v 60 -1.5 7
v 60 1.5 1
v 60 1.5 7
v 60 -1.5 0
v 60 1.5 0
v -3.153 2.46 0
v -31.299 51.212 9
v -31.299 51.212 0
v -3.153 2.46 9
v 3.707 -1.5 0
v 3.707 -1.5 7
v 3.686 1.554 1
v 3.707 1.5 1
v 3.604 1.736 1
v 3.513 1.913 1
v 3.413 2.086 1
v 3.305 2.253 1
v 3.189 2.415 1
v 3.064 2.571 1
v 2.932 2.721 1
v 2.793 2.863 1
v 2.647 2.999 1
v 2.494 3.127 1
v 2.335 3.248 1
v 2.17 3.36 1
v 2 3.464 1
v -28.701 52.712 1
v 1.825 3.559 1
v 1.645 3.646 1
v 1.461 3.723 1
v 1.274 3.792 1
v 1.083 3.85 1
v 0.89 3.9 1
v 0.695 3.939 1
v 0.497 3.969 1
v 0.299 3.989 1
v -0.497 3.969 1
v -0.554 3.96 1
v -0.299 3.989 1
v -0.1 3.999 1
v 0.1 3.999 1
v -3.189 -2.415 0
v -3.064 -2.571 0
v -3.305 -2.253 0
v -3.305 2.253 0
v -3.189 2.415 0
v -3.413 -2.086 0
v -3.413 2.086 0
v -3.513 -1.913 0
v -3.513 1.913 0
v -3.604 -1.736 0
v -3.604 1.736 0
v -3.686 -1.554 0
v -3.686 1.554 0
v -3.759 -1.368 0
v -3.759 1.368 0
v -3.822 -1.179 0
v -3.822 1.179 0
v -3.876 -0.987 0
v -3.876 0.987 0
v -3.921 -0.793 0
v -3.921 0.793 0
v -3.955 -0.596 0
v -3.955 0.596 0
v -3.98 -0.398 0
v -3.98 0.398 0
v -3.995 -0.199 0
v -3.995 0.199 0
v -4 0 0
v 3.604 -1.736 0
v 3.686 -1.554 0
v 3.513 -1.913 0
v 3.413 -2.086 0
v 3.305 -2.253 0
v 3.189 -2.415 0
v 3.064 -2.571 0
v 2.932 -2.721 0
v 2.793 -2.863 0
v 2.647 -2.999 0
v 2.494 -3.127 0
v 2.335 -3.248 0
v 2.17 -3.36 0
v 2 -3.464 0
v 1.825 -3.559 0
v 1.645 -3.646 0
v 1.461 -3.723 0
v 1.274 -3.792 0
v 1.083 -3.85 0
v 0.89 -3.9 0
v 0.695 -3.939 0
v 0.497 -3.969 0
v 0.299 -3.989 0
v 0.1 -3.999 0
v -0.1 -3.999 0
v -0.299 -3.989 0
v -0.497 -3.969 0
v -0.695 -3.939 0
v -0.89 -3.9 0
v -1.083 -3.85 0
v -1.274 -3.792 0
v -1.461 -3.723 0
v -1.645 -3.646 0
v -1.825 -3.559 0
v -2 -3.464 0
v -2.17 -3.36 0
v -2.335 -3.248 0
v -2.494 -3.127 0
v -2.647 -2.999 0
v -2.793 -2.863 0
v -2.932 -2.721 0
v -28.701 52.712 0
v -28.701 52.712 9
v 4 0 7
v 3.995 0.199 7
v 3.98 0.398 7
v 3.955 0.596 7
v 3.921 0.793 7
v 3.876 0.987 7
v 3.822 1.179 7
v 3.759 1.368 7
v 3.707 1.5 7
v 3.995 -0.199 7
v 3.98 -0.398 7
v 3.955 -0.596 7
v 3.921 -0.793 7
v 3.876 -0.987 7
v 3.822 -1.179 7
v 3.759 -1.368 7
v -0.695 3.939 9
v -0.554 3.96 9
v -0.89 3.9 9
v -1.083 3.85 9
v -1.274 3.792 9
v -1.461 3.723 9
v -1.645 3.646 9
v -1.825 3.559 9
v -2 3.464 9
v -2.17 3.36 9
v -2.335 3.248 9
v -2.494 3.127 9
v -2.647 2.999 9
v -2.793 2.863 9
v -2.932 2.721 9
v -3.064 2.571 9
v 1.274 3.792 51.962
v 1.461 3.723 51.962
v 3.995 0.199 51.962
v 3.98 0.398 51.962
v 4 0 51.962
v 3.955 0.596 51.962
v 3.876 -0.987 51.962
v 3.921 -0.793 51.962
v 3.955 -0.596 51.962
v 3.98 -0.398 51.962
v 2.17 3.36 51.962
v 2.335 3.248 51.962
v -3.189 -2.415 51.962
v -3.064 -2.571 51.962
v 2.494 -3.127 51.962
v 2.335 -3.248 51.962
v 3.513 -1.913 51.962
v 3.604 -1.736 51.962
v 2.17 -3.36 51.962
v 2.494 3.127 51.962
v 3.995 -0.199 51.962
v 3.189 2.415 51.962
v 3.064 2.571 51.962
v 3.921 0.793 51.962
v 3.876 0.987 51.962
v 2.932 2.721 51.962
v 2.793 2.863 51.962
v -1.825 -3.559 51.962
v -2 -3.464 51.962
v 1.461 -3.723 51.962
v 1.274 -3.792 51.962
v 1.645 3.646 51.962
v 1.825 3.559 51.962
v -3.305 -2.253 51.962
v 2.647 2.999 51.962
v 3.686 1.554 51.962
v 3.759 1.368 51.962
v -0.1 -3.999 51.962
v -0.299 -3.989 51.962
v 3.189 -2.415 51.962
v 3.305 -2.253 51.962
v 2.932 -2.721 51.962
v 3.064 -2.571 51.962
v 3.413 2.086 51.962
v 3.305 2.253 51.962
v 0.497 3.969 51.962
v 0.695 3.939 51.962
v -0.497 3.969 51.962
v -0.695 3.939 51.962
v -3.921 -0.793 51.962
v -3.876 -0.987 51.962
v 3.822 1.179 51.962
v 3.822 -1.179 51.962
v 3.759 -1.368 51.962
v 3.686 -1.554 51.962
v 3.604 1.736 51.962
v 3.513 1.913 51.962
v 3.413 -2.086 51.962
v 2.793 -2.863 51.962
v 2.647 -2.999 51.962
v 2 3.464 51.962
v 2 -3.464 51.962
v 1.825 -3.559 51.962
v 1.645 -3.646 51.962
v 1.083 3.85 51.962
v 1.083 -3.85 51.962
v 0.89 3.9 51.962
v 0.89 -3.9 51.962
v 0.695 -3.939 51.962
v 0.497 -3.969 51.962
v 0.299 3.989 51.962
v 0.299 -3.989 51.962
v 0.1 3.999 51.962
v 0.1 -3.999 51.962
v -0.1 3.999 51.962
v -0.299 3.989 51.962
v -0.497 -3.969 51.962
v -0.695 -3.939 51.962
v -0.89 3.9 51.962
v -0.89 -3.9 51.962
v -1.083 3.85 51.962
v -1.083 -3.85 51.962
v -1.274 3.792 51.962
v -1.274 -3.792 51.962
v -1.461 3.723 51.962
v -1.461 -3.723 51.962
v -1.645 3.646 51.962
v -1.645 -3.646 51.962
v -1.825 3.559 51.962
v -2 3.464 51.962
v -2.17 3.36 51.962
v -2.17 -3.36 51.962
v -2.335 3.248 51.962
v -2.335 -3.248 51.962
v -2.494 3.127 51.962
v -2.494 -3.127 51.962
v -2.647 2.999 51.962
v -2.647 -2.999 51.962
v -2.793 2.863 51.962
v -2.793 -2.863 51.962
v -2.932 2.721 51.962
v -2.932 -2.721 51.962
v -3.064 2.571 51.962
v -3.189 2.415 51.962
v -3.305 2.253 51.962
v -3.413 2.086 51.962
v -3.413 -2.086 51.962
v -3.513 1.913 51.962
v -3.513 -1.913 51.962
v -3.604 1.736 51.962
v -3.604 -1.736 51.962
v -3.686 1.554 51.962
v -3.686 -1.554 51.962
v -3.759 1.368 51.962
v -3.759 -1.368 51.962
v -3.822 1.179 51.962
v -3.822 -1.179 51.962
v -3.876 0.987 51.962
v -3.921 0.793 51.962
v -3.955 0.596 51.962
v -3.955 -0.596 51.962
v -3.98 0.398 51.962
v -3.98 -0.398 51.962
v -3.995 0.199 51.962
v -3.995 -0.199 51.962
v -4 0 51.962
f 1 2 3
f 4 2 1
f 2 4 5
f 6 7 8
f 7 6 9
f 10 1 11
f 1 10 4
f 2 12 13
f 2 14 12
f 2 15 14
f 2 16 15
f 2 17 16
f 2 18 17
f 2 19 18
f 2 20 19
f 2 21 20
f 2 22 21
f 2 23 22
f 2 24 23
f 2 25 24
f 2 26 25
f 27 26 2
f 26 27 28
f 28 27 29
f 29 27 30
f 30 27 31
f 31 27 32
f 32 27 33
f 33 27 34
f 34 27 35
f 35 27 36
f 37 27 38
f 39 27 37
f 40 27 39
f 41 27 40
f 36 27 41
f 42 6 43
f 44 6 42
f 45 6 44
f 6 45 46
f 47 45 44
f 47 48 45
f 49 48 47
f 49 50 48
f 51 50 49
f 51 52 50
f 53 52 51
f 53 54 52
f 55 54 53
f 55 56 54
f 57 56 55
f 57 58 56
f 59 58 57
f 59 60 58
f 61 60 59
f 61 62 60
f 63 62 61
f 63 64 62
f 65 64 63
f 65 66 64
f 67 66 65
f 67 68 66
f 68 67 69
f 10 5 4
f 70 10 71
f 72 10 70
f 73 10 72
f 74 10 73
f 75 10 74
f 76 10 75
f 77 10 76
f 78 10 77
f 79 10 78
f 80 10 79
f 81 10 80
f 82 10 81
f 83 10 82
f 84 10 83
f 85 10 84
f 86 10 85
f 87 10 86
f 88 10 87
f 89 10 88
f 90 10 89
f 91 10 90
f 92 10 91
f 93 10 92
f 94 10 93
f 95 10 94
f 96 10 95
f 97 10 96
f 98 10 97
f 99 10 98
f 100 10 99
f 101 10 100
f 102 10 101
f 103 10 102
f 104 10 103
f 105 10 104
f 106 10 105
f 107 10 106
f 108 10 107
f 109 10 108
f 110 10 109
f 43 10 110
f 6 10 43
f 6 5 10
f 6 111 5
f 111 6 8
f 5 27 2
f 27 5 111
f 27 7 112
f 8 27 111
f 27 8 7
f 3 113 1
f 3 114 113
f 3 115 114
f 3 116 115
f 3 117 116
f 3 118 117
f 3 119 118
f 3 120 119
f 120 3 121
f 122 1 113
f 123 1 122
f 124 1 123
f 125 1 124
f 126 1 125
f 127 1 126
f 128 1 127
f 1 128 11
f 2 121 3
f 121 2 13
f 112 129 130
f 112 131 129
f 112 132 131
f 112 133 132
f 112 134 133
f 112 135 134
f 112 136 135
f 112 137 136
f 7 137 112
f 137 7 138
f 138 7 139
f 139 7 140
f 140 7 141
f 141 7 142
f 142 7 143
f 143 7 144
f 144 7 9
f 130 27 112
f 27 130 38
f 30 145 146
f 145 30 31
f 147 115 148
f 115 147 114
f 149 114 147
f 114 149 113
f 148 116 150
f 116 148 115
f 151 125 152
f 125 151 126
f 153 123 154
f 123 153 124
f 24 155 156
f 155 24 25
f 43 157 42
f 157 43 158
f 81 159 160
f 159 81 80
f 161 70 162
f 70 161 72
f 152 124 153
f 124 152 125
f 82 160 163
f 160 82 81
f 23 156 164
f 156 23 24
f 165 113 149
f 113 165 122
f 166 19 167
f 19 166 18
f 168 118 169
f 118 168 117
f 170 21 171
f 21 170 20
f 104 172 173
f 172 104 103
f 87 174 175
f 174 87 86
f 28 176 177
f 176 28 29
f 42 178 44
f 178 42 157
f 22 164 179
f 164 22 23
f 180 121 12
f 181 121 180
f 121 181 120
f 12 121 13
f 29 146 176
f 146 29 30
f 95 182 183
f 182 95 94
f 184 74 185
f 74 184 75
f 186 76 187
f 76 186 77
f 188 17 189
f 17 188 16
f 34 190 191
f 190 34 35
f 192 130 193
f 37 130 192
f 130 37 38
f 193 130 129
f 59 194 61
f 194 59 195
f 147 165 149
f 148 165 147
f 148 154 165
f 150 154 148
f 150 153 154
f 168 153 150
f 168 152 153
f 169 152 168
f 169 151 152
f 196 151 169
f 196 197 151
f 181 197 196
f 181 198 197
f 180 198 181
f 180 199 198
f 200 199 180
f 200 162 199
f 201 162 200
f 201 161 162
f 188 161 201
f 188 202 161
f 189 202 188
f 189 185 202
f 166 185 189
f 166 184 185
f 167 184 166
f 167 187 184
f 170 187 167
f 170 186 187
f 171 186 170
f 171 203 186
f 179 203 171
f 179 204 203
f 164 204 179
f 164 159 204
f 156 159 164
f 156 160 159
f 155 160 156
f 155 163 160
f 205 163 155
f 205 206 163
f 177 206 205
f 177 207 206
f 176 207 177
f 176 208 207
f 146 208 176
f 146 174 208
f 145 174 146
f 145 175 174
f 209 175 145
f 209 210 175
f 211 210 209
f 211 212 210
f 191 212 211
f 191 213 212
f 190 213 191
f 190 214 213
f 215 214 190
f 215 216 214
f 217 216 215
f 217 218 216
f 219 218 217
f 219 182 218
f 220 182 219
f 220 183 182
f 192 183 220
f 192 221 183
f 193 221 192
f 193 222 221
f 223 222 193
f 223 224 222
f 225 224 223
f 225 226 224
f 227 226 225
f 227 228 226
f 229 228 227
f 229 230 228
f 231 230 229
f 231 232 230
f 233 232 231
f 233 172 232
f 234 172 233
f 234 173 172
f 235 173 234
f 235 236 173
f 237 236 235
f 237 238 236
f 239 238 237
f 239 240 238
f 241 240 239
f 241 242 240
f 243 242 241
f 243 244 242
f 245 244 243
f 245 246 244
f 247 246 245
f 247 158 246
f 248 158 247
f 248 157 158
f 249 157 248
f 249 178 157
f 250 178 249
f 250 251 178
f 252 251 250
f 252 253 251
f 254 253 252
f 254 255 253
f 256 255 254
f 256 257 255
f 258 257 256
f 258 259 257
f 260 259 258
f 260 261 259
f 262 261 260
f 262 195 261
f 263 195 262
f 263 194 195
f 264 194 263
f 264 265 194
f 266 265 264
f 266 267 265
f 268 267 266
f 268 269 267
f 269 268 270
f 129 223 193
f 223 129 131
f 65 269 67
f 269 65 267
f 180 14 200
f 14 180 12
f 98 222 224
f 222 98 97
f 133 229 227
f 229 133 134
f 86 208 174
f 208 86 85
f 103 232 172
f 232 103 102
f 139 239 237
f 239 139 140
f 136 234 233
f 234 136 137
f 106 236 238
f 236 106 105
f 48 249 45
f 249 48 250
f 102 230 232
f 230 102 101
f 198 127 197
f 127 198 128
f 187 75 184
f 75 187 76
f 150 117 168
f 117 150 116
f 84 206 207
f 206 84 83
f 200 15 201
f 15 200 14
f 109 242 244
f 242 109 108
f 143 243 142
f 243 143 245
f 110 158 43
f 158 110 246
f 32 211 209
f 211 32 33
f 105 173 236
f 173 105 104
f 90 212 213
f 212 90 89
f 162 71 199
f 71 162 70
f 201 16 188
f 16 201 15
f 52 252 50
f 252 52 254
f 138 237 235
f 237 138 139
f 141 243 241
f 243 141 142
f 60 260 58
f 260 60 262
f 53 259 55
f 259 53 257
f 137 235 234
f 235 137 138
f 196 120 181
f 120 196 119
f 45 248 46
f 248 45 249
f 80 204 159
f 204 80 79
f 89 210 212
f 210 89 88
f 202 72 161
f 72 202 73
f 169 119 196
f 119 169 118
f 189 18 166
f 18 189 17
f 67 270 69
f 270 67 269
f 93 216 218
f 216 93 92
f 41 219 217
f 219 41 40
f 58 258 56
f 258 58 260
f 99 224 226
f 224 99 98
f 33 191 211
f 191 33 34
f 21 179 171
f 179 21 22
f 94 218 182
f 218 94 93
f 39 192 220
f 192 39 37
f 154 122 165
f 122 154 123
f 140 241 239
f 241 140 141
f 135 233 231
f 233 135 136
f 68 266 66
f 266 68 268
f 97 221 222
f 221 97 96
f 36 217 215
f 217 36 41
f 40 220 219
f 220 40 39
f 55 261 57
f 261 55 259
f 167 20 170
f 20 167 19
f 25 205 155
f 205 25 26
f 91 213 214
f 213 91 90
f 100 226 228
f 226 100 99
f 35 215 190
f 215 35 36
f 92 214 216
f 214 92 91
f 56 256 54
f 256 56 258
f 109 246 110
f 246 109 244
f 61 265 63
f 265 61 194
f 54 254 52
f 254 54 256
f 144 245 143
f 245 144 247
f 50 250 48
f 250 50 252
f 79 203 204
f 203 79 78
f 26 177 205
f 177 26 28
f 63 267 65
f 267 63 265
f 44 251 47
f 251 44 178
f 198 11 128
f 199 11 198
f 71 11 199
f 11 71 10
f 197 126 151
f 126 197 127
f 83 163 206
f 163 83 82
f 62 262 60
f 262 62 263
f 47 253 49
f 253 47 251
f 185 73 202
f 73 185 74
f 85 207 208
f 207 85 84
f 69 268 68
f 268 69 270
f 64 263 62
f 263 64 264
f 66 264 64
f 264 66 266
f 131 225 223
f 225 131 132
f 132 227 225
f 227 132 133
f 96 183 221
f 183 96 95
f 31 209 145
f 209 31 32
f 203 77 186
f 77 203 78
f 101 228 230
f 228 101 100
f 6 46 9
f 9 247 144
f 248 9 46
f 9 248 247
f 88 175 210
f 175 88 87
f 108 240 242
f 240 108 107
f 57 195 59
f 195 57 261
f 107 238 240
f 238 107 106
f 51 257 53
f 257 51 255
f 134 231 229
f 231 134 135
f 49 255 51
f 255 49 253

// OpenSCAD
// Prints cross-products of a pair of vectors 
// Rich Cameron, 2019
// Prints cross-products  v x w
// "v" is a little lower than w

$fs = .2;
$fa = 2;
angle = 120;  // angle between vectors, degrees
width = 3;

hull() {
    translate([0, -width/2, 0]) cube([60, width, 1]);
    rotate([0,0,angle]) translate([0, -width/2, 0]) cube([60, width, 1]);
 }

translate([0, -width/2, 0]) cube([60, width, 7]);
rotate([0,0,angle]) translate([0, -width/2, 0]) cube([60, width, 9]);

// height of the cross-product 
 
cylinder(r=4, h=60*sin(angle));
